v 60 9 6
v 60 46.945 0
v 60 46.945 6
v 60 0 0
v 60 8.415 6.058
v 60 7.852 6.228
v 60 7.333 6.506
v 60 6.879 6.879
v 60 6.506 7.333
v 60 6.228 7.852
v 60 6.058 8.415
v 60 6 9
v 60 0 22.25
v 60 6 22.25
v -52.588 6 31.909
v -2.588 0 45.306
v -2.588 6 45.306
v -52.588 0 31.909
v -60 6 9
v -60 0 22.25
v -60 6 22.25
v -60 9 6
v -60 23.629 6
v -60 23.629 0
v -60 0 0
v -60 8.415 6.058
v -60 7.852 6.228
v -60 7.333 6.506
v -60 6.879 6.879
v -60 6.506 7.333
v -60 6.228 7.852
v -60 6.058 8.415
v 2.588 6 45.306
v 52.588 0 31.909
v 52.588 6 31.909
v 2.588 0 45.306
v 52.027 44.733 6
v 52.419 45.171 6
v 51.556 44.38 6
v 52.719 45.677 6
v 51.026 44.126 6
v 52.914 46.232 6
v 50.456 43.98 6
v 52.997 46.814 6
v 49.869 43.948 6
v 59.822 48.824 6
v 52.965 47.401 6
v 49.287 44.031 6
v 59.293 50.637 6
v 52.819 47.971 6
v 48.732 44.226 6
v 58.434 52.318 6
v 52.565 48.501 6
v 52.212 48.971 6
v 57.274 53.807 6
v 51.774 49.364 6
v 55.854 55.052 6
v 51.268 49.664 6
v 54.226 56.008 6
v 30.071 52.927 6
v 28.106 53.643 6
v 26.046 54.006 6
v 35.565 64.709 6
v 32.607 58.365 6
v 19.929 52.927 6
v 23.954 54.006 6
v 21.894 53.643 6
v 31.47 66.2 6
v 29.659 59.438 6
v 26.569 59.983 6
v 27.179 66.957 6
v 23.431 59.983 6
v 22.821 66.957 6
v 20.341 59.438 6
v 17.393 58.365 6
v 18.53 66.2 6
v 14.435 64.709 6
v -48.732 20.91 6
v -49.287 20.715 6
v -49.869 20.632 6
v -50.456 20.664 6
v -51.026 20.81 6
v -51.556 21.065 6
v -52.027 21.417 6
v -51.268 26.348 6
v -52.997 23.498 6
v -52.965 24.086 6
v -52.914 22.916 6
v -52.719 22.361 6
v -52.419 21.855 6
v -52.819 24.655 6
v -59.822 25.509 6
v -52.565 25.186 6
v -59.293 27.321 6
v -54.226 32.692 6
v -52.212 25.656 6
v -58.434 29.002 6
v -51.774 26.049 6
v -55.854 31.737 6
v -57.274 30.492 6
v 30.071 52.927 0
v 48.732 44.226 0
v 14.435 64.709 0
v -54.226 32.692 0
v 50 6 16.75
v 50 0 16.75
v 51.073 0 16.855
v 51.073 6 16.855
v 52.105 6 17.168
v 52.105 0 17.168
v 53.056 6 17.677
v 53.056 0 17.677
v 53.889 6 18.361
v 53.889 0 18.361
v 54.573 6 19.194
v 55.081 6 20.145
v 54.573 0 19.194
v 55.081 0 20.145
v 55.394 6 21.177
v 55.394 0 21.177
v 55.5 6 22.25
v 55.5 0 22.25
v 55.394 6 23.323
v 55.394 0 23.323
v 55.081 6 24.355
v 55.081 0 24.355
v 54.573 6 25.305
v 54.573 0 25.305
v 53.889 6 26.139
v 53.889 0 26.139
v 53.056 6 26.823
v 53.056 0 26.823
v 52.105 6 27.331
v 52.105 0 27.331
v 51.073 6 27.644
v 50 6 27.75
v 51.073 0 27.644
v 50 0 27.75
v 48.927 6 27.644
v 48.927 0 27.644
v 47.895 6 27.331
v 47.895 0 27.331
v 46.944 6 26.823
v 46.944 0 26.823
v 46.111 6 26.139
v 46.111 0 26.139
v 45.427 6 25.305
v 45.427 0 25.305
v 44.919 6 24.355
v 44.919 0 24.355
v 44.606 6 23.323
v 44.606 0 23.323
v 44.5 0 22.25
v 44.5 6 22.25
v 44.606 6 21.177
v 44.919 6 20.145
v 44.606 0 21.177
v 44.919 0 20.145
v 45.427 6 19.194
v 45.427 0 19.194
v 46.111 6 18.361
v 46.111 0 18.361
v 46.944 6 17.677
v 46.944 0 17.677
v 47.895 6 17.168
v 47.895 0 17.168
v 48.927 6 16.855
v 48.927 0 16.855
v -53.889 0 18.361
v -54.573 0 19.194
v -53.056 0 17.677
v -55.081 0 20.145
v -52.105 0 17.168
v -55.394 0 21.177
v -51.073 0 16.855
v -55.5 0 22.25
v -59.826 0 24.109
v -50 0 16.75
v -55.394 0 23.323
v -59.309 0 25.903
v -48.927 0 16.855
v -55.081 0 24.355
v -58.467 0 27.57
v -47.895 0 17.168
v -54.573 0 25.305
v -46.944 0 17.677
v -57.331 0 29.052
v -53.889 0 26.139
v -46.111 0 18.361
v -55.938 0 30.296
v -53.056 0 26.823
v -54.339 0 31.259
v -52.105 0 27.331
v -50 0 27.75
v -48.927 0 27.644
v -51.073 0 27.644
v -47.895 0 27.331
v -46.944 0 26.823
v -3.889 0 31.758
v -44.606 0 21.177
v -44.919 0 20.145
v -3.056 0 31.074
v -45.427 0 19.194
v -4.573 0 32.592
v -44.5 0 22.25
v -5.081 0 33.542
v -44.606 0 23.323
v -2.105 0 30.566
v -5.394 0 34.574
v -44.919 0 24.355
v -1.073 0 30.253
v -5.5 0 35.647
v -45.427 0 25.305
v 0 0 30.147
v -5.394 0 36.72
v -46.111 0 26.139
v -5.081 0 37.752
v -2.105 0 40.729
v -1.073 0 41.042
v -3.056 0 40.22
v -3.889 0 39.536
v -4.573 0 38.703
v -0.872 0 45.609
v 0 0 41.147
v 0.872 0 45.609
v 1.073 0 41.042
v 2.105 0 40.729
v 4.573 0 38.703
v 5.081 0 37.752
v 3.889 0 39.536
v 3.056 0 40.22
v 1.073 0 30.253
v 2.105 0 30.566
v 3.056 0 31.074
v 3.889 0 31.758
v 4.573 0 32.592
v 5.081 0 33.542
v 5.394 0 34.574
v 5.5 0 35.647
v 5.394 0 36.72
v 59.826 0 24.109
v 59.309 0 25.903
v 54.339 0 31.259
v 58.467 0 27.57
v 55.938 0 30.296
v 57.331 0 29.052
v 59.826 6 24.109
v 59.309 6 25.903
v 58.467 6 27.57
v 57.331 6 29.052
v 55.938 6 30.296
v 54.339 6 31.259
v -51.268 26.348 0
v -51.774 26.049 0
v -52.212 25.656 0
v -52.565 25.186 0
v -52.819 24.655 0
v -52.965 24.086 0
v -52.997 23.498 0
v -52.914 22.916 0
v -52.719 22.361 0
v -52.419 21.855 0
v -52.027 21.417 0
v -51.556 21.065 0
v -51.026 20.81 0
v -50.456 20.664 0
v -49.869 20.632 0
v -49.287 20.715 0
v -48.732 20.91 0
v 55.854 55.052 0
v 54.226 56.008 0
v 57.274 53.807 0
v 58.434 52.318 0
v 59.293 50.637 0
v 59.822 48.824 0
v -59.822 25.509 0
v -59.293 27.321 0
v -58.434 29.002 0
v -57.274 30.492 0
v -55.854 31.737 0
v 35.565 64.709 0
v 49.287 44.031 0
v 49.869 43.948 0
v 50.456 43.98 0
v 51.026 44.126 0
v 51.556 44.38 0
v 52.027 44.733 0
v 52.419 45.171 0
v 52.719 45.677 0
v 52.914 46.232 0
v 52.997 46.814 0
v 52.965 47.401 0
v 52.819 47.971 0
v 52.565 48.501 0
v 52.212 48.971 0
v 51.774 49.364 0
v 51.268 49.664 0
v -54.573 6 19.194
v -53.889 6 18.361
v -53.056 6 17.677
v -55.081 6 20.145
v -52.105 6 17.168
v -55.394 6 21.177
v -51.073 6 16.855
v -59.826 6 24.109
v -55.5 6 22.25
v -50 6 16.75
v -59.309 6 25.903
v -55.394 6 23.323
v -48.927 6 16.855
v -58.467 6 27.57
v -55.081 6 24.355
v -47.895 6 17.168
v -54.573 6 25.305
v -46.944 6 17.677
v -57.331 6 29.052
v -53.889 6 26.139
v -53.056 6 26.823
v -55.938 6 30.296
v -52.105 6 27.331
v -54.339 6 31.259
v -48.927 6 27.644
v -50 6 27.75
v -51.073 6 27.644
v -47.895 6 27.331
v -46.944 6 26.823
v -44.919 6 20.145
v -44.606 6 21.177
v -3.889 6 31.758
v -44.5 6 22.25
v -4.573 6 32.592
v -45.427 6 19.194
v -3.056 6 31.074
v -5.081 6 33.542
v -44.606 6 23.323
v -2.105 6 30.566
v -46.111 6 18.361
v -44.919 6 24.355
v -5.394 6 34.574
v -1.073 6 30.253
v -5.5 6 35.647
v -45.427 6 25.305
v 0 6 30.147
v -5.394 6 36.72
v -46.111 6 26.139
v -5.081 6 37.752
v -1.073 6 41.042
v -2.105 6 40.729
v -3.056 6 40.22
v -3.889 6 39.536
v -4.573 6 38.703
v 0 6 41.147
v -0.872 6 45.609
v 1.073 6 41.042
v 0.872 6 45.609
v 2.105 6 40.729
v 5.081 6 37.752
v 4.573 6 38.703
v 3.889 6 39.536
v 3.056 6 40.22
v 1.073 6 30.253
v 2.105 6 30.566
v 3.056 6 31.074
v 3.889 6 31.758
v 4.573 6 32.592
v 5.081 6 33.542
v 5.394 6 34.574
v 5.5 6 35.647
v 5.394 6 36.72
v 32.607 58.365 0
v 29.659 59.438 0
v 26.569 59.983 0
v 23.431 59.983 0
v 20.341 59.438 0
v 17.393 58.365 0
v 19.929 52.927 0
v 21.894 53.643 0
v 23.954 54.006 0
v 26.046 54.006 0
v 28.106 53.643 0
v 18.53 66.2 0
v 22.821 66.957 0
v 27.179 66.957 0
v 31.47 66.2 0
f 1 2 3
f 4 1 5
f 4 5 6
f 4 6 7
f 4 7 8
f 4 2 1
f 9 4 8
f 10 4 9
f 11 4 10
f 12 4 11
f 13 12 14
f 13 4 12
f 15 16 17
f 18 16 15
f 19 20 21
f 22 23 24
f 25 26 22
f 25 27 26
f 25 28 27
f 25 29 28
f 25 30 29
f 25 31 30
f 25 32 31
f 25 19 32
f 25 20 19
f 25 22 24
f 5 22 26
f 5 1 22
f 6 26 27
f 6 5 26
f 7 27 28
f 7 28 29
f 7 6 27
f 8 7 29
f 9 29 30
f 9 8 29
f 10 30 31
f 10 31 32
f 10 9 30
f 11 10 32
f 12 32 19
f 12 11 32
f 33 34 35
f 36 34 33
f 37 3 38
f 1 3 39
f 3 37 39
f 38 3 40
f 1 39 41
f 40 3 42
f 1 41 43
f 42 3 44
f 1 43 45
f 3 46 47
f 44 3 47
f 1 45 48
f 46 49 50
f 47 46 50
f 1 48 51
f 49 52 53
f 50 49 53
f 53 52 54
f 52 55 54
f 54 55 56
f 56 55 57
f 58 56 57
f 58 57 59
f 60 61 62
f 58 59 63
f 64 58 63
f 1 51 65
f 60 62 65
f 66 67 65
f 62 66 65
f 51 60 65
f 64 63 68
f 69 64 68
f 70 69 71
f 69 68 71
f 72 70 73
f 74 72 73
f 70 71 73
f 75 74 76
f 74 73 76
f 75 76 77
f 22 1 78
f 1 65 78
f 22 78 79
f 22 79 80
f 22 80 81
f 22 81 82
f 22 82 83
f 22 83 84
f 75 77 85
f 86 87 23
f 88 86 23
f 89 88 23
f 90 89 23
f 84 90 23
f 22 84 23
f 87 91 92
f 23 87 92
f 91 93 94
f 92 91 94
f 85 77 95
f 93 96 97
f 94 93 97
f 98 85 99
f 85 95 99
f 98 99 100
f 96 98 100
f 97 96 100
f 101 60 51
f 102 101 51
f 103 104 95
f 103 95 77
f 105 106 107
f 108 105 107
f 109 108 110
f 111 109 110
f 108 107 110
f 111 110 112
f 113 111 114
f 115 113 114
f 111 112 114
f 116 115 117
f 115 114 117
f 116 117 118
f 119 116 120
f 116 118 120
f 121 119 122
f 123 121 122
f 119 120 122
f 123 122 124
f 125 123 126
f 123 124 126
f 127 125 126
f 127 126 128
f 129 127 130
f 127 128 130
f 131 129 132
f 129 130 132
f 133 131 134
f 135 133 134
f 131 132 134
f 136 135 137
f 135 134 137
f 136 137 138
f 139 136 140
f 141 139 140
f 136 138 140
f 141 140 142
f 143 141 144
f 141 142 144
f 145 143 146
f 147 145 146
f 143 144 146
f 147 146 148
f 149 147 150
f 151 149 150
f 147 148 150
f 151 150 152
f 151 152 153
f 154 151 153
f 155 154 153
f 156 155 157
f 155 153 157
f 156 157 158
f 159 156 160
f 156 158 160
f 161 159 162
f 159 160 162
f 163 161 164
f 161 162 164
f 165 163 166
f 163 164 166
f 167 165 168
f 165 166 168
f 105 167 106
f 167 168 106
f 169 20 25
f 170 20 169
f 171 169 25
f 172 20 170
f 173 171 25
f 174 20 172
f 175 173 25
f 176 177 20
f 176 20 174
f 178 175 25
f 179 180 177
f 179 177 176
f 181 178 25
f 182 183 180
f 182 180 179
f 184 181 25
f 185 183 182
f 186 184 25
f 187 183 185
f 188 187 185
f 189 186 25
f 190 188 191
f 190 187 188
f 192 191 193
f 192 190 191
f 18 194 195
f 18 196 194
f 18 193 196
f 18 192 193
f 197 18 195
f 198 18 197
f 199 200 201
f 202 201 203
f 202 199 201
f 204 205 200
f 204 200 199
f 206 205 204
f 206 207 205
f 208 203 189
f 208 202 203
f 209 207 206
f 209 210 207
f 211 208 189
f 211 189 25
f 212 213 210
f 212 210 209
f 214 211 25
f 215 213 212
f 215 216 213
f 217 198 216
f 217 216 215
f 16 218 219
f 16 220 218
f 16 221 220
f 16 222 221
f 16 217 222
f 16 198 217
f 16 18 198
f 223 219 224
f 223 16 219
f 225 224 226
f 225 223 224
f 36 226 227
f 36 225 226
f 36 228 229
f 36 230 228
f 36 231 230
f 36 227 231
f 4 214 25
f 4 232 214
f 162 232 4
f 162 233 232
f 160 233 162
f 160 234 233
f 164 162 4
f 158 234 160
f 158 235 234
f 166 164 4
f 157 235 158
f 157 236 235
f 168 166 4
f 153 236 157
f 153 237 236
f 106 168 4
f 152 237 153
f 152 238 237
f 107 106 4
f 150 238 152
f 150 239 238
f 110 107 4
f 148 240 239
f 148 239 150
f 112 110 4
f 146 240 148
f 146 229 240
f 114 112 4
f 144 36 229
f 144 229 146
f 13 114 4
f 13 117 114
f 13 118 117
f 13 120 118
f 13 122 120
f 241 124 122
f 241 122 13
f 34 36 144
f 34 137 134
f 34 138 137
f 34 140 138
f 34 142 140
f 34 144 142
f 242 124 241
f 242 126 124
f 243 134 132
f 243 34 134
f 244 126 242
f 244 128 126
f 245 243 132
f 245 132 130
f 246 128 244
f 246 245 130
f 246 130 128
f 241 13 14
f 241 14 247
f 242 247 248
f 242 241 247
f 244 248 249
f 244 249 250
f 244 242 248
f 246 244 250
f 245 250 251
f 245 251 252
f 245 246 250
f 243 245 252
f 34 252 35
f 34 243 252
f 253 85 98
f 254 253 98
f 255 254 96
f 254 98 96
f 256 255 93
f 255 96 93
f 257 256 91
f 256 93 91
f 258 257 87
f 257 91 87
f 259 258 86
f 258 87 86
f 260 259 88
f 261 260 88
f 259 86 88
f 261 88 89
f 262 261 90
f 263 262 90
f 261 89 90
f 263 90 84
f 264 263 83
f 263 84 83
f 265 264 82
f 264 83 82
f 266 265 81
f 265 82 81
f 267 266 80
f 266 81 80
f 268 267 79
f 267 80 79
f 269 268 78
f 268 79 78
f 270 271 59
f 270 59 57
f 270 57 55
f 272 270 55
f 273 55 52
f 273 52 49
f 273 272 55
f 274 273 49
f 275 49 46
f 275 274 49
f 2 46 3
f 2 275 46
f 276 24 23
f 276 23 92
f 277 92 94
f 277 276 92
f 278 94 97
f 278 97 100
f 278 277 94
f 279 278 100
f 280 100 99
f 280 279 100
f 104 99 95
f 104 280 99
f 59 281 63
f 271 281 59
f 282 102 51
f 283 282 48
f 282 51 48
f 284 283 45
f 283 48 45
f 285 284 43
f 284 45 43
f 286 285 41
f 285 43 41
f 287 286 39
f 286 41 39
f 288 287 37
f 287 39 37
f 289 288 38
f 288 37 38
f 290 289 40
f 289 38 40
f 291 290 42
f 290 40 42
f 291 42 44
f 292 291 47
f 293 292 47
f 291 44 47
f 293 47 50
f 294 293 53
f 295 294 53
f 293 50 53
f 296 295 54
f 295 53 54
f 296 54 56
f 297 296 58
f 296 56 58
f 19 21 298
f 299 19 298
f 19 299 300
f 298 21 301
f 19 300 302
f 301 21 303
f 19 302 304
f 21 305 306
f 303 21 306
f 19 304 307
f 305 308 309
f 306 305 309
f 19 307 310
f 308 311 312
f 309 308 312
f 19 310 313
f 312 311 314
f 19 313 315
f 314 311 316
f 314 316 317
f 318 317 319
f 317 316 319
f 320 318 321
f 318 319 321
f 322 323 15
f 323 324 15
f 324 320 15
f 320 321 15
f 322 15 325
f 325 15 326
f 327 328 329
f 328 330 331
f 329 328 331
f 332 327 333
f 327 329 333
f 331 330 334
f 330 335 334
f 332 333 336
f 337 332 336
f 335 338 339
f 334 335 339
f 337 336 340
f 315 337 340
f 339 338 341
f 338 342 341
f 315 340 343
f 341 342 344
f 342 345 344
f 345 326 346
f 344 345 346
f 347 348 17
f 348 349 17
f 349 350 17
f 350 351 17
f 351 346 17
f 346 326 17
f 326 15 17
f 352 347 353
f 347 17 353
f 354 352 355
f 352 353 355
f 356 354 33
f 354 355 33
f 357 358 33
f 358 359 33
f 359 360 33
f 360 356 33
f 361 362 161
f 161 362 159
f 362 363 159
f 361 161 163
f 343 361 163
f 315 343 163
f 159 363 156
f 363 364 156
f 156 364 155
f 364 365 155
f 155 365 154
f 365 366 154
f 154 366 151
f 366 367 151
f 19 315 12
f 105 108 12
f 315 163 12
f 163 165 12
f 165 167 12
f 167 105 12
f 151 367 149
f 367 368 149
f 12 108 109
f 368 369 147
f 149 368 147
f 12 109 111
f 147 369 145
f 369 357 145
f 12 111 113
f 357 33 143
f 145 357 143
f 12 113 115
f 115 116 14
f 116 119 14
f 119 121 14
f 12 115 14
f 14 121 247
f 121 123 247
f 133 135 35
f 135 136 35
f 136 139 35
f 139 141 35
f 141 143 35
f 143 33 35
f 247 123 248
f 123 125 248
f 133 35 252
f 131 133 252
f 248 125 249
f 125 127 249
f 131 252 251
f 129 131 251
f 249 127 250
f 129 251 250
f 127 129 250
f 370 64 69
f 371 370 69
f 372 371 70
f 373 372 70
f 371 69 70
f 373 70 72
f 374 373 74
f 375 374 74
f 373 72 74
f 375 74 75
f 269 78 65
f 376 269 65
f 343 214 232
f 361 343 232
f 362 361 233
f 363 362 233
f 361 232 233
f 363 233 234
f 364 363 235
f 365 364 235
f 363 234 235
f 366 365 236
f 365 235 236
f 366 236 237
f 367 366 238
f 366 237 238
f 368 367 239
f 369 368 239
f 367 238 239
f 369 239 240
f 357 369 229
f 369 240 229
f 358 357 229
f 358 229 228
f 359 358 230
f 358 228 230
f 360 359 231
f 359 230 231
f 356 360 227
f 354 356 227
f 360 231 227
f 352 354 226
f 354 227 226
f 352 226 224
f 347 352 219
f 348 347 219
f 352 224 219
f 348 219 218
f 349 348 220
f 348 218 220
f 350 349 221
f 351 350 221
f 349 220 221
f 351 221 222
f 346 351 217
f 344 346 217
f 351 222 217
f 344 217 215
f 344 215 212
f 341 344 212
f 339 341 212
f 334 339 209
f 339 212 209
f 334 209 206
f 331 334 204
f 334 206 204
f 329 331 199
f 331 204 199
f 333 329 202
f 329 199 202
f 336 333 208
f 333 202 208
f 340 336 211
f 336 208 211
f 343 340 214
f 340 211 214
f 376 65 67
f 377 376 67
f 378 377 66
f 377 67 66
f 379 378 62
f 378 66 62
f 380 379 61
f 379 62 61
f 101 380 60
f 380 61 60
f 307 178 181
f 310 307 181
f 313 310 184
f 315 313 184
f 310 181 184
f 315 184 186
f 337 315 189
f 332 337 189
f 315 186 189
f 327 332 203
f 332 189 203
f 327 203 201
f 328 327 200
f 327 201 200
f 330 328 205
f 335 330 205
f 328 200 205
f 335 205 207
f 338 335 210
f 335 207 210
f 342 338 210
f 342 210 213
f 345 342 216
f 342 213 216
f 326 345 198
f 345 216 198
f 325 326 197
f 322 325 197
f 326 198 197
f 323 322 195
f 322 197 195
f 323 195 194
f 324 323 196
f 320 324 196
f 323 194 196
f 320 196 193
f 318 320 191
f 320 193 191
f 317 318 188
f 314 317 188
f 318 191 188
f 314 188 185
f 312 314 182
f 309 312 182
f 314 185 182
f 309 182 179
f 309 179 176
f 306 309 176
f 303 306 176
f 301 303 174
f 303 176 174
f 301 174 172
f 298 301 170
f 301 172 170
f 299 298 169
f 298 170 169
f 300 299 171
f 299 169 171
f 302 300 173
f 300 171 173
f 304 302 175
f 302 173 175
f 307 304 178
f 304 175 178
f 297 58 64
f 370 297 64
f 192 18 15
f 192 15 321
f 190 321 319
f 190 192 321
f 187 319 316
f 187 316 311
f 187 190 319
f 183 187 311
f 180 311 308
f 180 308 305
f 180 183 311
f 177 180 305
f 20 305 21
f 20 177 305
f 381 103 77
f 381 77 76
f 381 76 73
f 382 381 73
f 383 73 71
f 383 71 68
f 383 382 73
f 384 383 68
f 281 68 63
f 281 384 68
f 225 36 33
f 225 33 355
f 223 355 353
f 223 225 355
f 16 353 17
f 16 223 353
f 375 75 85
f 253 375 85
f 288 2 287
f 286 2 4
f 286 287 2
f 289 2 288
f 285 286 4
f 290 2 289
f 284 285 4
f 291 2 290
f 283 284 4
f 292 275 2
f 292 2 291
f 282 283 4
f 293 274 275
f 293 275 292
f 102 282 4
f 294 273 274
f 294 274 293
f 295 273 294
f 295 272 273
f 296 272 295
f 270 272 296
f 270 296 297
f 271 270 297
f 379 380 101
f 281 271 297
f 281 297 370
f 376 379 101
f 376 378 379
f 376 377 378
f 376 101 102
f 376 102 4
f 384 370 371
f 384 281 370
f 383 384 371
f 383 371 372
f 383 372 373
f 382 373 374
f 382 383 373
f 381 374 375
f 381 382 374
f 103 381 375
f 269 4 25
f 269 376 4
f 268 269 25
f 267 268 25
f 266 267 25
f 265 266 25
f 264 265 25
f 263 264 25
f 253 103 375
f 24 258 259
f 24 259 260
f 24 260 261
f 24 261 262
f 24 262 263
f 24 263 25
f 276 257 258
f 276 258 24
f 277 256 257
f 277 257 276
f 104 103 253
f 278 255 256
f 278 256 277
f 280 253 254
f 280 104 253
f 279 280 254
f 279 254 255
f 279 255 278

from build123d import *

# Parameters (mm, degrees)
EXTRUDE_1_DEPTH     = 6
SKETCH_2_R          = 5.5
EXTRUDE_2_DEPTH     = 6
FILLET_1_R          = 3
CUT_EXTRUDE_1_DEPTH = 99.325146161


with BuildPart() as part:
    # Эскиз1 → Бобышка-Вытянуть1 (new body)
    with BuildSketch(Plane.XY):
        with BuildLine():
            Line((-60, 0), (-60, 23.629297392))
            ThreePointArc((-60, 23.629297392), (-58.433914458, 29.002293475), (-54.226182617, 32.692375262))
            Line((-54.226182617, 32.692375262), (14.434543456, 64.709397645))
            ThreePointArc((14.434543456, 64.709397645), (25, 67.051702969), (35.565456544, 64.709397645))
            Line((35.565456544, 64.709397645), (54.226182617, 56.00775817))
            ThreePointArc((54.226182617, 56.00775817), (58.433914458, 52.317676383), (60, 46.9446803))
            Line((60, 46.9446803), (60, 0))
            Line((60, 0), (-60, 0))
        make_face()
    extrude(amount=EXTRUDE_1_DEPTH)

    # Эскиз2 → Бобышка-Вытянуть2 (add)
    with BuildSketch(Plane.XZ):
        with BuildLine():
            Line((-60, 6), (60, 6))
            Line((60, 6), (60, 22.249778574))
            ThreePointArc((60, 22.249778574), (57.933533403, 28.337392864), (52.588190451, 31.909036837))
            Line((52.588190451, 31.909036837), (2.588190451, 45.306496459))
            ThreePointArc((2.588190451, 45.306496459), (0, 45.647238196), (-2.588190451, 45.306496459))
            Line((-2.588190451, 45.306496459), (-52.588190451, 31.909036837))
            ThreePointArc((-52.588190451, 31.909036837), (-57.933533403, 28.337392864), (-60, 22.249778574))
            Line((-60, 22.249778574), (-60, 6))
        make_face()
        with Locations(Location((-50, 22.249778574, 0), (0, 0, 270))):
            Circle(SKETCH_2_R, mode=Mode.SUBTRACT)
        with Locations(Location((0, 35.647238196, 0), (0, 0, 270))):
            Circle(SKETCH_2_R, mode=Mode.SUBTRACT)
        with Locations(Location((50, 22.249778574, 0), (0, 0, 270))):
            Circle(SKETCH_2_R, mode=Mode.SUBTRACT)
    extrude(amount=-EXTRUDE_2_DEPTH)

    # Скругление1
    fillet_1_edges = [part.edges().sort_by_distance(p)[0] for p in [
        (0, 6, 6),
    ]]
    fillet(fillet_1_edges, radius=FILLET_1_R)

    # Эскиз3 → Вырез-Вытянуть1 (cut, through all)
    with BuildSketch(Plane.XY.offset(6)):
        with BuildLine():
            Line((51.267854785, 49.663603661), (32.607128711, 58.365243136))
            ThreePointArc((32.607128711, 58.365243136), (25, 60.051702969), (17.392871289, 58.365243136))
            Line((17.392871289, 58.365243136), (-51.267854785, 26.348220753))
            ThreePointArc((-51.267854785, 26.348220753), (-52.718923361, 22.361442607), (-48.732145215, 20.910374031))
            Line((-48.732145215, 20.910374031), (19.928580859, 52.927396414))
            ThreePointArc((19.928580859, 52.927396414), (25, 54.051702969), (30.071419141, 52.927396414))
            Line((30.071419141, 52.927396414), (48.732145215, 44.225756939))
            ThreePointArc((48.732145215, 44.225756939), (52.718923361, 45.676825514), (51.267854785, 49.663603661))
        make_face()
    extrude(amount=-CUT_EXTRUDE_1_DEPTH, mode=Mode.SUBTRACT)


solid = part.part
